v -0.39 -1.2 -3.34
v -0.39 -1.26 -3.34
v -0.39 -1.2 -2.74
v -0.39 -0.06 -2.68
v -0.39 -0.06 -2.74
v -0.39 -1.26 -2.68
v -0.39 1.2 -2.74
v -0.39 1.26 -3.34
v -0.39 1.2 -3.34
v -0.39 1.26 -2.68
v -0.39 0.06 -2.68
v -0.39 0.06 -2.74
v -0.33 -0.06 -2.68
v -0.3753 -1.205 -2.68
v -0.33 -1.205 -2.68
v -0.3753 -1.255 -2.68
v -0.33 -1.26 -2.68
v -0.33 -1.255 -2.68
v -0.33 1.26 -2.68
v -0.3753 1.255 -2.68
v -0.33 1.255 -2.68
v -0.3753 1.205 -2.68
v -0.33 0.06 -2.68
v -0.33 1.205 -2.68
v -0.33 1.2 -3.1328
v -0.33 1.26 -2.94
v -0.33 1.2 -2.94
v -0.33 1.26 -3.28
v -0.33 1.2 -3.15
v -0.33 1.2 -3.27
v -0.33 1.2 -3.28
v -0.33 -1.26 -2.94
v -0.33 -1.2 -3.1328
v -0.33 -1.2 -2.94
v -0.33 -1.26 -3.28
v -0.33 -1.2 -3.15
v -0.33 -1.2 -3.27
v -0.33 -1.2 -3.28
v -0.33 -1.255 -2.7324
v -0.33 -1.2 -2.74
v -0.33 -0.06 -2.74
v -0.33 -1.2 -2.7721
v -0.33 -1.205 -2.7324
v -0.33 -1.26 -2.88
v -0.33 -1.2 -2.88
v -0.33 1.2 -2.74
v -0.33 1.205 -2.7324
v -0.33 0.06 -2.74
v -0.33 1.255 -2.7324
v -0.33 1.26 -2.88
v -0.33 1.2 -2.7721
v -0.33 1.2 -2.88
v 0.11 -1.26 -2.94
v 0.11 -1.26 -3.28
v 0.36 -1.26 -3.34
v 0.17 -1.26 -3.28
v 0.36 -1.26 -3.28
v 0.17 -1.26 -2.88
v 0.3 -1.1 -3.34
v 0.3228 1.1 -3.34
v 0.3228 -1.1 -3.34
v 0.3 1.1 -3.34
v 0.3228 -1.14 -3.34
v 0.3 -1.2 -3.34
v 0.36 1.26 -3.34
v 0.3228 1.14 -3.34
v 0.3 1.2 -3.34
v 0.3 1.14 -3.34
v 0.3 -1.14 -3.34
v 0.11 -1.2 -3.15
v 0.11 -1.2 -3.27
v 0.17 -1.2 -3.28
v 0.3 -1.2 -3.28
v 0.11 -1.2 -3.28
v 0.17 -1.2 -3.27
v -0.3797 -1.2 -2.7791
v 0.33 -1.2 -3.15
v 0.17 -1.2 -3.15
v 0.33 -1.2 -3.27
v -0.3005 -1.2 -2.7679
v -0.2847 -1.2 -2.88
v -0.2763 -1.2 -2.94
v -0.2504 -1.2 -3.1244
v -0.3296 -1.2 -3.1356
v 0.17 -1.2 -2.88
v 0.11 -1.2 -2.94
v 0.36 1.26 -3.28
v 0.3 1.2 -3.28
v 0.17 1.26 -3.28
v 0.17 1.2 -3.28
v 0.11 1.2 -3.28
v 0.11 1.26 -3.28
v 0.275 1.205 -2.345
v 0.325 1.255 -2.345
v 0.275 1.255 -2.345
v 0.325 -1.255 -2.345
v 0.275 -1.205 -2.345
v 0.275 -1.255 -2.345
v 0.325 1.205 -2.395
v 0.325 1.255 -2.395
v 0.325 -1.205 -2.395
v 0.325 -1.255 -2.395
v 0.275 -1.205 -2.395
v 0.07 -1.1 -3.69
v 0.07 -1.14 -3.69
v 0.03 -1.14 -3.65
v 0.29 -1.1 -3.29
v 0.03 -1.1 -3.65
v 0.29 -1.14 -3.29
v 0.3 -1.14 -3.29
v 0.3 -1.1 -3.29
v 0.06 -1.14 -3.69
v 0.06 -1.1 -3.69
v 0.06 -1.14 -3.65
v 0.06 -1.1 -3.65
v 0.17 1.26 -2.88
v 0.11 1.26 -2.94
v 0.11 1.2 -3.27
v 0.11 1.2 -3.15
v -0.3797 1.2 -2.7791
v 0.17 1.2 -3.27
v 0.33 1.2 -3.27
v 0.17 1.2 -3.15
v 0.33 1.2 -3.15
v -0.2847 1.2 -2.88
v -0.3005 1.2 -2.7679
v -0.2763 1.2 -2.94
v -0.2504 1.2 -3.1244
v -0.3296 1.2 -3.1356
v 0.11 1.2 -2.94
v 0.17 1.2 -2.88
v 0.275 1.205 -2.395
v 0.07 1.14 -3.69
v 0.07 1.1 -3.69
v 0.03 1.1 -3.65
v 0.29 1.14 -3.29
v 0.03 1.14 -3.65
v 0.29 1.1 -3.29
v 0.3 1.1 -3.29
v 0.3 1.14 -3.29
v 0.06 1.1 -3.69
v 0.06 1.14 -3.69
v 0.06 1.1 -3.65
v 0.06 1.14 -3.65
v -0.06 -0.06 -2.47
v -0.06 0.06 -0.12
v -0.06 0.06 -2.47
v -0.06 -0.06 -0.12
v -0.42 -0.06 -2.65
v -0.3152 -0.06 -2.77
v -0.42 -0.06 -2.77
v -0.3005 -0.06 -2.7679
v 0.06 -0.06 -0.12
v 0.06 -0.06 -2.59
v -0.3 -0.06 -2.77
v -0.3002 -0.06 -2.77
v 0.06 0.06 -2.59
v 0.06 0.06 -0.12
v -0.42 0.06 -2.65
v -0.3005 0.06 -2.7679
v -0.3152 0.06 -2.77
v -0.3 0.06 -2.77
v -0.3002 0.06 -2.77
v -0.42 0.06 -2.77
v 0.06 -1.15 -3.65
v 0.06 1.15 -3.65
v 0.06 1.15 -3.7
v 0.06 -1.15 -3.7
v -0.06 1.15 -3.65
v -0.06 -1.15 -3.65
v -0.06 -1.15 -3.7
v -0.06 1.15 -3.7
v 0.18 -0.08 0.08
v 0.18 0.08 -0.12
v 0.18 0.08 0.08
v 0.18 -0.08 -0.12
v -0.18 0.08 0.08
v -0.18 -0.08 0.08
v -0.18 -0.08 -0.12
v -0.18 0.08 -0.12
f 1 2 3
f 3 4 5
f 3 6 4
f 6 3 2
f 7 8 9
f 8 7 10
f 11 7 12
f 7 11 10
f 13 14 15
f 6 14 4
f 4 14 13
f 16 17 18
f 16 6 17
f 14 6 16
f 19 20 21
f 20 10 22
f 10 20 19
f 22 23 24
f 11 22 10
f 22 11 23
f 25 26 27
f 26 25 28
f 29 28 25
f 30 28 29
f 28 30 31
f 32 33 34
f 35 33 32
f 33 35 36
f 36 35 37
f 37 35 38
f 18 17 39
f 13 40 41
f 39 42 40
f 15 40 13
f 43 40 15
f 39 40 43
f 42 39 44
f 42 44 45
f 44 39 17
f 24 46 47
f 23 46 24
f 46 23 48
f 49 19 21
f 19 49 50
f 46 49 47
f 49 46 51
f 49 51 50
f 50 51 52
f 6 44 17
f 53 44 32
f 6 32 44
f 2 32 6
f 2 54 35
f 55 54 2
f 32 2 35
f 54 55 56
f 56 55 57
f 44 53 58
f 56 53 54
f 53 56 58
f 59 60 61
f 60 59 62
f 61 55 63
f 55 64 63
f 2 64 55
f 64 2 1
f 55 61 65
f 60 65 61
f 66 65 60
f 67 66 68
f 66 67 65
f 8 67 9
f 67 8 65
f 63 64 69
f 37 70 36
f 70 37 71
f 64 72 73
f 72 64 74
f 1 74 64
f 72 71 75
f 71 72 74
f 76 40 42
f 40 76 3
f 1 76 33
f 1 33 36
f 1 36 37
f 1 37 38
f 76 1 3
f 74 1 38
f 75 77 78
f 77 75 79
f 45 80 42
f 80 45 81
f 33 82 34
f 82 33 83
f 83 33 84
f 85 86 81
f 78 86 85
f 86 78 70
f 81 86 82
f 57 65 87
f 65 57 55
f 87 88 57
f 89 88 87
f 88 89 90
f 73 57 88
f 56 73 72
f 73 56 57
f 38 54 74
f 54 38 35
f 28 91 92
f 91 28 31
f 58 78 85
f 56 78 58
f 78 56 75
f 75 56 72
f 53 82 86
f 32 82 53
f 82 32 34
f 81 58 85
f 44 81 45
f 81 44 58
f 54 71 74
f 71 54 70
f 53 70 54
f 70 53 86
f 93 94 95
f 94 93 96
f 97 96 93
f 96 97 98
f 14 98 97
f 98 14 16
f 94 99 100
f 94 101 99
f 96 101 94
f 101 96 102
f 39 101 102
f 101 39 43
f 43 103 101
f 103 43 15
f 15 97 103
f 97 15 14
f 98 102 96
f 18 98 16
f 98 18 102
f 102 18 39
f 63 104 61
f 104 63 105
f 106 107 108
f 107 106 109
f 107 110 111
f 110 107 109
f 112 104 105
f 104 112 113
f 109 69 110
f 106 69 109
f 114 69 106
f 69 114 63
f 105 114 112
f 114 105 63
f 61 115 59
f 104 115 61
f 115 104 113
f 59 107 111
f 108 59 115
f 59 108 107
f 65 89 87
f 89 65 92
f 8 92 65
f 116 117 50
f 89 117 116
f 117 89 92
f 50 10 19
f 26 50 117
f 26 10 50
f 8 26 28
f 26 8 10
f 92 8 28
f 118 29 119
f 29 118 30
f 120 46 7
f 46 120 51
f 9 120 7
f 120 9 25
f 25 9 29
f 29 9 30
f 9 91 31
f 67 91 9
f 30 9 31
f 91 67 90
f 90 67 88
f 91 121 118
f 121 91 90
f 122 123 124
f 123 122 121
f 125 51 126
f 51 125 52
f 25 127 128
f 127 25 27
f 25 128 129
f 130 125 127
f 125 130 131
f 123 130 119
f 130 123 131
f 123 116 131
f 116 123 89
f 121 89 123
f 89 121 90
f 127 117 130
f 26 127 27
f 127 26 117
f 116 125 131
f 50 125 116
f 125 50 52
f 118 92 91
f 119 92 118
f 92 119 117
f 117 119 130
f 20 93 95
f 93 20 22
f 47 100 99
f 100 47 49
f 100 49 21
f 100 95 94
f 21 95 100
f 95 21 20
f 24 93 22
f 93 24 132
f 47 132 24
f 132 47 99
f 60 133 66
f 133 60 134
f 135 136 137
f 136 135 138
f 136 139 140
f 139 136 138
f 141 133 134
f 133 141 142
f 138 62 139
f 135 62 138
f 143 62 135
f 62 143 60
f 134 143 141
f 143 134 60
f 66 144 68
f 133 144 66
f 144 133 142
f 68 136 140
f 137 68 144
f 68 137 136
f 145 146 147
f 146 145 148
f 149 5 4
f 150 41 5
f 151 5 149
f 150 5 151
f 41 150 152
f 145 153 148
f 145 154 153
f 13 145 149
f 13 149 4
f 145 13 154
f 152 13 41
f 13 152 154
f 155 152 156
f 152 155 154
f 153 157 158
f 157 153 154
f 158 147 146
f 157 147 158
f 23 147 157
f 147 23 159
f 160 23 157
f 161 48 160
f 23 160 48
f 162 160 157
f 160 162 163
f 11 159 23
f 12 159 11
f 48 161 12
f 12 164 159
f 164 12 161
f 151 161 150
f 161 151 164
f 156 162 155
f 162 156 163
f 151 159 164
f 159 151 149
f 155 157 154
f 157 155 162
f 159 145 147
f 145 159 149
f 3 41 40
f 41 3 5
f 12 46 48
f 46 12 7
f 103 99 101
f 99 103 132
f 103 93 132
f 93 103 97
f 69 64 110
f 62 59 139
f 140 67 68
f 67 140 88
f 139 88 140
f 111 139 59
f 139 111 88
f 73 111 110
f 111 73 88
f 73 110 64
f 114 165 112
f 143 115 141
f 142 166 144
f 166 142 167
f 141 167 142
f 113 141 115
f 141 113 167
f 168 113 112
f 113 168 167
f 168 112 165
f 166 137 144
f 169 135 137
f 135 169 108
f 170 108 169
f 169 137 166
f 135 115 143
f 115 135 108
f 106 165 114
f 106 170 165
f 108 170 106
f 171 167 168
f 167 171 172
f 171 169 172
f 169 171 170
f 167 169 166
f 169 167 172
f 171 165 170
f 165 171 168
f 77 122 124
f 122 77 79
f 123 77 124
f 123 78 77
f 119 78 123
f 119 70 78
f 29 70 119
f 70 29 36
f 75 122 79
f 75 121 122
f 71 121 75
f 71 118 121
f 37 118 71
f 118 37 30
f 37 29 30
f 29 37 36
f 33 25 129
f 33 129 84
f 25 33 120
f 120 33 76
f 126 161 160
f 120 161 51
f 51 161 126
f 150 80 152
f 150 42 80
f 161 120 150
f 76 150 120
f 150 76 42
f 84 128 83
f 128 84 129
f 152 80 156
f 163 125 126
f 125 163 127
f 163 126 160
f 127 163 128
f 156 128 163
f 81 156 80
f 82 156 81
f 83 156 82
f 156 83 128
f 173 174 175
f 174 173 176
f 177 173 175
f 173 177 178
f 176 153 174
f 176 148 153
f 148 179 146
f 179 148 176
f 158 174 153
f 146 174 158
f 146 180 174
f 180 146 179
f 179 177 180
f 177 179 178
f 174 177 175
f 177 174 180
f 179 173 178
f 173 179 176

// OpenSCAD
// file: lib/chair_kit.scad
// Chair kit — the chairlift chair shared by the double, quad, and 6-pack
// (chair.scad, chair_quad.scad, chair_6pack.scad), which differ in width,
// cushion colour, and hanger weight.
//
//     +X = forward (direction the chair travels along the cable)
//     +Y = seat width (lateral, perpendicular to cable)
//     +Z = up
//
// The origin is the cable-attachment point and the chair hangs in -Z. A
// grip clamps the cable; a hanger drops behind the riders to a yoke over
// the backrest; side frames carry the seat, armrests, and a restraint bar
// (shown raised); a footrest hangs under the riders' feet. Riders are
// placed by the slots with their feet on the footrest, which hangs
// cable_h below the cable: the cable's height at a station
// (world.BullwheelHeight), so at the bullwheel a rider's skis are on the
// snow as the chair picks them up or sets them down. Everything else
// hangs from the seat height that gives.
//
// Conventions, units, and axis docs: see models-src/README.md.

$fn = 10;

// ── Shared dimensions (metres) ─────────────────────────────────────────
cable_h       = 3.65;  // world.BullwheelHeight
chair_depth   = 0.66;  // seat front to back (X)
foot_top_z    = -cable_h;          // footrest top: where riders' feet go (the slots)
seat_top_z    = foot_top_z + 0.50; // top of the seat cushion
seat_cushion  = 0.12;
seat_frame_z  = seat_top_z - seat_cushion - 0.04; // bar under the cushion
back_x        = -chair_depth / 2;                 // back edge of the seat
back_bot_z    = seat_top_z + 0.02;
back_top_z    = seat_top_z + 0.38;
back_cushion  = 0.08;
yoke_z        = seat_top_z + 0.44; // the bar over the backrest
restraint_z   = seat_top_z + 0.78; // the raised restraint bar, clear of riders' heads
grip_len      = 0.36;
foot_x        = 0;     // under the riders, at the slots' X
bar          = 0.06;   // frame tube section
frame_color   = [0.24, 0.26, 0.29];
grip_color    = [0.55, 0.57, 0.60];

// A box between two points, `s` thick: a frame tube.
module tube(a, b, s = bar) {
    hull() {
        translate(a) cube(s, center = true);
        translate(b) cube(s, center = true);
    }
}

// ── The chair ──────────────────────────────────────────────────────────
// w: seat width; cushion: seat and backrest colour; hanger: hanger section.
module chair(w, cushion, hanger = 0.10) {
    half = w / 2;
    ex = half + 0.03; // side frames, just outside the seat

    // Grip on the cable.
    color(grip_color)
        translate([0, 0, -0.02])
            cube([grip_len, 0.16, 0.20], center = true);

    color(frame_color) {
        // Hanger: down from the grip, then back over the riders' heads to
        // the yoke.
        tube([0, 0, -0.08], [0, 0, yoke_z + 0.18], hanger);
        tube([0, 0, yoke_z + 0.18], [back_x - 0.03, 0, yoke_z], hanger);
        // Yoke over the backrest, the full width.
        tube([back_x - 0.03, -ex, yoke_z], [back_x - 0.03, ex, yoke_z]);
        for (s = [-1, 1]) {
            y = s * ex;
            // Side frame: down the back, then forward under the seat.
            tube([back_x - 0.03, y, yoke_z], [back_x - 0.03, y, seat_frame_z]);
            tube([back_x - 0.03, y, seat_frame_z], [-back_x, y, seat_frame_z]);
            // Armrest with a post at its front.
            tube([back_x - 0.03, y, seat_top_z + 0.24], [0.14, y, seat_top_z + 0.24]);
            tube([0.14, y, seat_top_z + 0.24], [0.14, y, seat_frame_z]);
            // Restraint bar arm, raised: from the yoke up and forward.
            tube([back_x - 0.03, y, yoke_z], [0.30, y, restraint_z], 0.05);
            // Footrest hanger from the front of the seat.
            tube([-back_x - 0.02, s * (half - 0.08), seat_frame_z],
                 [foot_x + 0.05, s * (half - 0.08), foot_top_z - 0.02], 0.04);
        }
        // Restraint bar across the front, raised clear of the riders.
        tube([0.30, -ex, restraint_z], [0.30, ex, restraint_z], 0.05);
        // Cross tube under the front of the seat.
        tube([-back_x, -ex, seat_frame_z], [-back_x, ex, seat_frame_z]);
        // Footrest: the riders stand their skis on it.
        translate([foot_x, 0, foot_top_z - 0.025])
            cube([0.12, w - 0.1, 0.05], center = true);
    }

    color(cushion) {
        // Seat cushion.
        translate([0, 0, seat_top_z - seat_cushion / 2])
            cube([chair_depth, w, seat_cushion], center = true);
        // Backrest cushion, leaning back a touch.
        translate([back_x + back_cushion / 2, 0, back_bot_z])
            rotate([0, -8, 0])
                translate([0, 0, (back_top_z - back_bot_z) / 2])
                    cube([back_cushion, w, back_top_z - back_bot_z], center = true);
    }
}
// main file
// Chairlift chair — a quad (fixed-grip and high-speed quads share it),
// built from the chair kit (lib/chair_kit.scad).
//
// Conventions, units, and axis docs: see models-src/README.md.

include <lib/chair_kit.scad>

seat_w = 2.40; // 4-person, real-world quads run 2.3–2.5 m wide

chair(seat_w, [0.22, 0.42, 0.68], hanger = 0.12);

// ── Passenger seat anchors ─────────────────────────────────────────────
// Four slots laterally arranged at y = ±0.30 and ±0.90 metres — 0.60 m
// centre-to-centre between adjacent riders, 0.30 m clearance to the
// outer edges of the 2.40 m seat. scad2obj captures these as `# slot`
// comment lines in chair_quad.obj (already converted to game coords).
slot_x        = 0;           // centred along seat depth
slot_inner_y  = 0.30;        // inner pair
slot_outer_y  = 0.90;        // outer pair
slot_z        = foot_top_z;  // top of the footrest

echo("MOGUL_META", "slot", 0, slot_x, -slot_outer_y, slot_z);
echo("MOGUL_META", "slot", 1, slot_x, -slot_inner_y, slot_z);
echo("MOGUL_META", "slot", 2, slot_x,  slot_inner_y, slot_z);
echo("MOGUL_META", "slot", 3, slot_x,  slot_outer_y, slot_z);
